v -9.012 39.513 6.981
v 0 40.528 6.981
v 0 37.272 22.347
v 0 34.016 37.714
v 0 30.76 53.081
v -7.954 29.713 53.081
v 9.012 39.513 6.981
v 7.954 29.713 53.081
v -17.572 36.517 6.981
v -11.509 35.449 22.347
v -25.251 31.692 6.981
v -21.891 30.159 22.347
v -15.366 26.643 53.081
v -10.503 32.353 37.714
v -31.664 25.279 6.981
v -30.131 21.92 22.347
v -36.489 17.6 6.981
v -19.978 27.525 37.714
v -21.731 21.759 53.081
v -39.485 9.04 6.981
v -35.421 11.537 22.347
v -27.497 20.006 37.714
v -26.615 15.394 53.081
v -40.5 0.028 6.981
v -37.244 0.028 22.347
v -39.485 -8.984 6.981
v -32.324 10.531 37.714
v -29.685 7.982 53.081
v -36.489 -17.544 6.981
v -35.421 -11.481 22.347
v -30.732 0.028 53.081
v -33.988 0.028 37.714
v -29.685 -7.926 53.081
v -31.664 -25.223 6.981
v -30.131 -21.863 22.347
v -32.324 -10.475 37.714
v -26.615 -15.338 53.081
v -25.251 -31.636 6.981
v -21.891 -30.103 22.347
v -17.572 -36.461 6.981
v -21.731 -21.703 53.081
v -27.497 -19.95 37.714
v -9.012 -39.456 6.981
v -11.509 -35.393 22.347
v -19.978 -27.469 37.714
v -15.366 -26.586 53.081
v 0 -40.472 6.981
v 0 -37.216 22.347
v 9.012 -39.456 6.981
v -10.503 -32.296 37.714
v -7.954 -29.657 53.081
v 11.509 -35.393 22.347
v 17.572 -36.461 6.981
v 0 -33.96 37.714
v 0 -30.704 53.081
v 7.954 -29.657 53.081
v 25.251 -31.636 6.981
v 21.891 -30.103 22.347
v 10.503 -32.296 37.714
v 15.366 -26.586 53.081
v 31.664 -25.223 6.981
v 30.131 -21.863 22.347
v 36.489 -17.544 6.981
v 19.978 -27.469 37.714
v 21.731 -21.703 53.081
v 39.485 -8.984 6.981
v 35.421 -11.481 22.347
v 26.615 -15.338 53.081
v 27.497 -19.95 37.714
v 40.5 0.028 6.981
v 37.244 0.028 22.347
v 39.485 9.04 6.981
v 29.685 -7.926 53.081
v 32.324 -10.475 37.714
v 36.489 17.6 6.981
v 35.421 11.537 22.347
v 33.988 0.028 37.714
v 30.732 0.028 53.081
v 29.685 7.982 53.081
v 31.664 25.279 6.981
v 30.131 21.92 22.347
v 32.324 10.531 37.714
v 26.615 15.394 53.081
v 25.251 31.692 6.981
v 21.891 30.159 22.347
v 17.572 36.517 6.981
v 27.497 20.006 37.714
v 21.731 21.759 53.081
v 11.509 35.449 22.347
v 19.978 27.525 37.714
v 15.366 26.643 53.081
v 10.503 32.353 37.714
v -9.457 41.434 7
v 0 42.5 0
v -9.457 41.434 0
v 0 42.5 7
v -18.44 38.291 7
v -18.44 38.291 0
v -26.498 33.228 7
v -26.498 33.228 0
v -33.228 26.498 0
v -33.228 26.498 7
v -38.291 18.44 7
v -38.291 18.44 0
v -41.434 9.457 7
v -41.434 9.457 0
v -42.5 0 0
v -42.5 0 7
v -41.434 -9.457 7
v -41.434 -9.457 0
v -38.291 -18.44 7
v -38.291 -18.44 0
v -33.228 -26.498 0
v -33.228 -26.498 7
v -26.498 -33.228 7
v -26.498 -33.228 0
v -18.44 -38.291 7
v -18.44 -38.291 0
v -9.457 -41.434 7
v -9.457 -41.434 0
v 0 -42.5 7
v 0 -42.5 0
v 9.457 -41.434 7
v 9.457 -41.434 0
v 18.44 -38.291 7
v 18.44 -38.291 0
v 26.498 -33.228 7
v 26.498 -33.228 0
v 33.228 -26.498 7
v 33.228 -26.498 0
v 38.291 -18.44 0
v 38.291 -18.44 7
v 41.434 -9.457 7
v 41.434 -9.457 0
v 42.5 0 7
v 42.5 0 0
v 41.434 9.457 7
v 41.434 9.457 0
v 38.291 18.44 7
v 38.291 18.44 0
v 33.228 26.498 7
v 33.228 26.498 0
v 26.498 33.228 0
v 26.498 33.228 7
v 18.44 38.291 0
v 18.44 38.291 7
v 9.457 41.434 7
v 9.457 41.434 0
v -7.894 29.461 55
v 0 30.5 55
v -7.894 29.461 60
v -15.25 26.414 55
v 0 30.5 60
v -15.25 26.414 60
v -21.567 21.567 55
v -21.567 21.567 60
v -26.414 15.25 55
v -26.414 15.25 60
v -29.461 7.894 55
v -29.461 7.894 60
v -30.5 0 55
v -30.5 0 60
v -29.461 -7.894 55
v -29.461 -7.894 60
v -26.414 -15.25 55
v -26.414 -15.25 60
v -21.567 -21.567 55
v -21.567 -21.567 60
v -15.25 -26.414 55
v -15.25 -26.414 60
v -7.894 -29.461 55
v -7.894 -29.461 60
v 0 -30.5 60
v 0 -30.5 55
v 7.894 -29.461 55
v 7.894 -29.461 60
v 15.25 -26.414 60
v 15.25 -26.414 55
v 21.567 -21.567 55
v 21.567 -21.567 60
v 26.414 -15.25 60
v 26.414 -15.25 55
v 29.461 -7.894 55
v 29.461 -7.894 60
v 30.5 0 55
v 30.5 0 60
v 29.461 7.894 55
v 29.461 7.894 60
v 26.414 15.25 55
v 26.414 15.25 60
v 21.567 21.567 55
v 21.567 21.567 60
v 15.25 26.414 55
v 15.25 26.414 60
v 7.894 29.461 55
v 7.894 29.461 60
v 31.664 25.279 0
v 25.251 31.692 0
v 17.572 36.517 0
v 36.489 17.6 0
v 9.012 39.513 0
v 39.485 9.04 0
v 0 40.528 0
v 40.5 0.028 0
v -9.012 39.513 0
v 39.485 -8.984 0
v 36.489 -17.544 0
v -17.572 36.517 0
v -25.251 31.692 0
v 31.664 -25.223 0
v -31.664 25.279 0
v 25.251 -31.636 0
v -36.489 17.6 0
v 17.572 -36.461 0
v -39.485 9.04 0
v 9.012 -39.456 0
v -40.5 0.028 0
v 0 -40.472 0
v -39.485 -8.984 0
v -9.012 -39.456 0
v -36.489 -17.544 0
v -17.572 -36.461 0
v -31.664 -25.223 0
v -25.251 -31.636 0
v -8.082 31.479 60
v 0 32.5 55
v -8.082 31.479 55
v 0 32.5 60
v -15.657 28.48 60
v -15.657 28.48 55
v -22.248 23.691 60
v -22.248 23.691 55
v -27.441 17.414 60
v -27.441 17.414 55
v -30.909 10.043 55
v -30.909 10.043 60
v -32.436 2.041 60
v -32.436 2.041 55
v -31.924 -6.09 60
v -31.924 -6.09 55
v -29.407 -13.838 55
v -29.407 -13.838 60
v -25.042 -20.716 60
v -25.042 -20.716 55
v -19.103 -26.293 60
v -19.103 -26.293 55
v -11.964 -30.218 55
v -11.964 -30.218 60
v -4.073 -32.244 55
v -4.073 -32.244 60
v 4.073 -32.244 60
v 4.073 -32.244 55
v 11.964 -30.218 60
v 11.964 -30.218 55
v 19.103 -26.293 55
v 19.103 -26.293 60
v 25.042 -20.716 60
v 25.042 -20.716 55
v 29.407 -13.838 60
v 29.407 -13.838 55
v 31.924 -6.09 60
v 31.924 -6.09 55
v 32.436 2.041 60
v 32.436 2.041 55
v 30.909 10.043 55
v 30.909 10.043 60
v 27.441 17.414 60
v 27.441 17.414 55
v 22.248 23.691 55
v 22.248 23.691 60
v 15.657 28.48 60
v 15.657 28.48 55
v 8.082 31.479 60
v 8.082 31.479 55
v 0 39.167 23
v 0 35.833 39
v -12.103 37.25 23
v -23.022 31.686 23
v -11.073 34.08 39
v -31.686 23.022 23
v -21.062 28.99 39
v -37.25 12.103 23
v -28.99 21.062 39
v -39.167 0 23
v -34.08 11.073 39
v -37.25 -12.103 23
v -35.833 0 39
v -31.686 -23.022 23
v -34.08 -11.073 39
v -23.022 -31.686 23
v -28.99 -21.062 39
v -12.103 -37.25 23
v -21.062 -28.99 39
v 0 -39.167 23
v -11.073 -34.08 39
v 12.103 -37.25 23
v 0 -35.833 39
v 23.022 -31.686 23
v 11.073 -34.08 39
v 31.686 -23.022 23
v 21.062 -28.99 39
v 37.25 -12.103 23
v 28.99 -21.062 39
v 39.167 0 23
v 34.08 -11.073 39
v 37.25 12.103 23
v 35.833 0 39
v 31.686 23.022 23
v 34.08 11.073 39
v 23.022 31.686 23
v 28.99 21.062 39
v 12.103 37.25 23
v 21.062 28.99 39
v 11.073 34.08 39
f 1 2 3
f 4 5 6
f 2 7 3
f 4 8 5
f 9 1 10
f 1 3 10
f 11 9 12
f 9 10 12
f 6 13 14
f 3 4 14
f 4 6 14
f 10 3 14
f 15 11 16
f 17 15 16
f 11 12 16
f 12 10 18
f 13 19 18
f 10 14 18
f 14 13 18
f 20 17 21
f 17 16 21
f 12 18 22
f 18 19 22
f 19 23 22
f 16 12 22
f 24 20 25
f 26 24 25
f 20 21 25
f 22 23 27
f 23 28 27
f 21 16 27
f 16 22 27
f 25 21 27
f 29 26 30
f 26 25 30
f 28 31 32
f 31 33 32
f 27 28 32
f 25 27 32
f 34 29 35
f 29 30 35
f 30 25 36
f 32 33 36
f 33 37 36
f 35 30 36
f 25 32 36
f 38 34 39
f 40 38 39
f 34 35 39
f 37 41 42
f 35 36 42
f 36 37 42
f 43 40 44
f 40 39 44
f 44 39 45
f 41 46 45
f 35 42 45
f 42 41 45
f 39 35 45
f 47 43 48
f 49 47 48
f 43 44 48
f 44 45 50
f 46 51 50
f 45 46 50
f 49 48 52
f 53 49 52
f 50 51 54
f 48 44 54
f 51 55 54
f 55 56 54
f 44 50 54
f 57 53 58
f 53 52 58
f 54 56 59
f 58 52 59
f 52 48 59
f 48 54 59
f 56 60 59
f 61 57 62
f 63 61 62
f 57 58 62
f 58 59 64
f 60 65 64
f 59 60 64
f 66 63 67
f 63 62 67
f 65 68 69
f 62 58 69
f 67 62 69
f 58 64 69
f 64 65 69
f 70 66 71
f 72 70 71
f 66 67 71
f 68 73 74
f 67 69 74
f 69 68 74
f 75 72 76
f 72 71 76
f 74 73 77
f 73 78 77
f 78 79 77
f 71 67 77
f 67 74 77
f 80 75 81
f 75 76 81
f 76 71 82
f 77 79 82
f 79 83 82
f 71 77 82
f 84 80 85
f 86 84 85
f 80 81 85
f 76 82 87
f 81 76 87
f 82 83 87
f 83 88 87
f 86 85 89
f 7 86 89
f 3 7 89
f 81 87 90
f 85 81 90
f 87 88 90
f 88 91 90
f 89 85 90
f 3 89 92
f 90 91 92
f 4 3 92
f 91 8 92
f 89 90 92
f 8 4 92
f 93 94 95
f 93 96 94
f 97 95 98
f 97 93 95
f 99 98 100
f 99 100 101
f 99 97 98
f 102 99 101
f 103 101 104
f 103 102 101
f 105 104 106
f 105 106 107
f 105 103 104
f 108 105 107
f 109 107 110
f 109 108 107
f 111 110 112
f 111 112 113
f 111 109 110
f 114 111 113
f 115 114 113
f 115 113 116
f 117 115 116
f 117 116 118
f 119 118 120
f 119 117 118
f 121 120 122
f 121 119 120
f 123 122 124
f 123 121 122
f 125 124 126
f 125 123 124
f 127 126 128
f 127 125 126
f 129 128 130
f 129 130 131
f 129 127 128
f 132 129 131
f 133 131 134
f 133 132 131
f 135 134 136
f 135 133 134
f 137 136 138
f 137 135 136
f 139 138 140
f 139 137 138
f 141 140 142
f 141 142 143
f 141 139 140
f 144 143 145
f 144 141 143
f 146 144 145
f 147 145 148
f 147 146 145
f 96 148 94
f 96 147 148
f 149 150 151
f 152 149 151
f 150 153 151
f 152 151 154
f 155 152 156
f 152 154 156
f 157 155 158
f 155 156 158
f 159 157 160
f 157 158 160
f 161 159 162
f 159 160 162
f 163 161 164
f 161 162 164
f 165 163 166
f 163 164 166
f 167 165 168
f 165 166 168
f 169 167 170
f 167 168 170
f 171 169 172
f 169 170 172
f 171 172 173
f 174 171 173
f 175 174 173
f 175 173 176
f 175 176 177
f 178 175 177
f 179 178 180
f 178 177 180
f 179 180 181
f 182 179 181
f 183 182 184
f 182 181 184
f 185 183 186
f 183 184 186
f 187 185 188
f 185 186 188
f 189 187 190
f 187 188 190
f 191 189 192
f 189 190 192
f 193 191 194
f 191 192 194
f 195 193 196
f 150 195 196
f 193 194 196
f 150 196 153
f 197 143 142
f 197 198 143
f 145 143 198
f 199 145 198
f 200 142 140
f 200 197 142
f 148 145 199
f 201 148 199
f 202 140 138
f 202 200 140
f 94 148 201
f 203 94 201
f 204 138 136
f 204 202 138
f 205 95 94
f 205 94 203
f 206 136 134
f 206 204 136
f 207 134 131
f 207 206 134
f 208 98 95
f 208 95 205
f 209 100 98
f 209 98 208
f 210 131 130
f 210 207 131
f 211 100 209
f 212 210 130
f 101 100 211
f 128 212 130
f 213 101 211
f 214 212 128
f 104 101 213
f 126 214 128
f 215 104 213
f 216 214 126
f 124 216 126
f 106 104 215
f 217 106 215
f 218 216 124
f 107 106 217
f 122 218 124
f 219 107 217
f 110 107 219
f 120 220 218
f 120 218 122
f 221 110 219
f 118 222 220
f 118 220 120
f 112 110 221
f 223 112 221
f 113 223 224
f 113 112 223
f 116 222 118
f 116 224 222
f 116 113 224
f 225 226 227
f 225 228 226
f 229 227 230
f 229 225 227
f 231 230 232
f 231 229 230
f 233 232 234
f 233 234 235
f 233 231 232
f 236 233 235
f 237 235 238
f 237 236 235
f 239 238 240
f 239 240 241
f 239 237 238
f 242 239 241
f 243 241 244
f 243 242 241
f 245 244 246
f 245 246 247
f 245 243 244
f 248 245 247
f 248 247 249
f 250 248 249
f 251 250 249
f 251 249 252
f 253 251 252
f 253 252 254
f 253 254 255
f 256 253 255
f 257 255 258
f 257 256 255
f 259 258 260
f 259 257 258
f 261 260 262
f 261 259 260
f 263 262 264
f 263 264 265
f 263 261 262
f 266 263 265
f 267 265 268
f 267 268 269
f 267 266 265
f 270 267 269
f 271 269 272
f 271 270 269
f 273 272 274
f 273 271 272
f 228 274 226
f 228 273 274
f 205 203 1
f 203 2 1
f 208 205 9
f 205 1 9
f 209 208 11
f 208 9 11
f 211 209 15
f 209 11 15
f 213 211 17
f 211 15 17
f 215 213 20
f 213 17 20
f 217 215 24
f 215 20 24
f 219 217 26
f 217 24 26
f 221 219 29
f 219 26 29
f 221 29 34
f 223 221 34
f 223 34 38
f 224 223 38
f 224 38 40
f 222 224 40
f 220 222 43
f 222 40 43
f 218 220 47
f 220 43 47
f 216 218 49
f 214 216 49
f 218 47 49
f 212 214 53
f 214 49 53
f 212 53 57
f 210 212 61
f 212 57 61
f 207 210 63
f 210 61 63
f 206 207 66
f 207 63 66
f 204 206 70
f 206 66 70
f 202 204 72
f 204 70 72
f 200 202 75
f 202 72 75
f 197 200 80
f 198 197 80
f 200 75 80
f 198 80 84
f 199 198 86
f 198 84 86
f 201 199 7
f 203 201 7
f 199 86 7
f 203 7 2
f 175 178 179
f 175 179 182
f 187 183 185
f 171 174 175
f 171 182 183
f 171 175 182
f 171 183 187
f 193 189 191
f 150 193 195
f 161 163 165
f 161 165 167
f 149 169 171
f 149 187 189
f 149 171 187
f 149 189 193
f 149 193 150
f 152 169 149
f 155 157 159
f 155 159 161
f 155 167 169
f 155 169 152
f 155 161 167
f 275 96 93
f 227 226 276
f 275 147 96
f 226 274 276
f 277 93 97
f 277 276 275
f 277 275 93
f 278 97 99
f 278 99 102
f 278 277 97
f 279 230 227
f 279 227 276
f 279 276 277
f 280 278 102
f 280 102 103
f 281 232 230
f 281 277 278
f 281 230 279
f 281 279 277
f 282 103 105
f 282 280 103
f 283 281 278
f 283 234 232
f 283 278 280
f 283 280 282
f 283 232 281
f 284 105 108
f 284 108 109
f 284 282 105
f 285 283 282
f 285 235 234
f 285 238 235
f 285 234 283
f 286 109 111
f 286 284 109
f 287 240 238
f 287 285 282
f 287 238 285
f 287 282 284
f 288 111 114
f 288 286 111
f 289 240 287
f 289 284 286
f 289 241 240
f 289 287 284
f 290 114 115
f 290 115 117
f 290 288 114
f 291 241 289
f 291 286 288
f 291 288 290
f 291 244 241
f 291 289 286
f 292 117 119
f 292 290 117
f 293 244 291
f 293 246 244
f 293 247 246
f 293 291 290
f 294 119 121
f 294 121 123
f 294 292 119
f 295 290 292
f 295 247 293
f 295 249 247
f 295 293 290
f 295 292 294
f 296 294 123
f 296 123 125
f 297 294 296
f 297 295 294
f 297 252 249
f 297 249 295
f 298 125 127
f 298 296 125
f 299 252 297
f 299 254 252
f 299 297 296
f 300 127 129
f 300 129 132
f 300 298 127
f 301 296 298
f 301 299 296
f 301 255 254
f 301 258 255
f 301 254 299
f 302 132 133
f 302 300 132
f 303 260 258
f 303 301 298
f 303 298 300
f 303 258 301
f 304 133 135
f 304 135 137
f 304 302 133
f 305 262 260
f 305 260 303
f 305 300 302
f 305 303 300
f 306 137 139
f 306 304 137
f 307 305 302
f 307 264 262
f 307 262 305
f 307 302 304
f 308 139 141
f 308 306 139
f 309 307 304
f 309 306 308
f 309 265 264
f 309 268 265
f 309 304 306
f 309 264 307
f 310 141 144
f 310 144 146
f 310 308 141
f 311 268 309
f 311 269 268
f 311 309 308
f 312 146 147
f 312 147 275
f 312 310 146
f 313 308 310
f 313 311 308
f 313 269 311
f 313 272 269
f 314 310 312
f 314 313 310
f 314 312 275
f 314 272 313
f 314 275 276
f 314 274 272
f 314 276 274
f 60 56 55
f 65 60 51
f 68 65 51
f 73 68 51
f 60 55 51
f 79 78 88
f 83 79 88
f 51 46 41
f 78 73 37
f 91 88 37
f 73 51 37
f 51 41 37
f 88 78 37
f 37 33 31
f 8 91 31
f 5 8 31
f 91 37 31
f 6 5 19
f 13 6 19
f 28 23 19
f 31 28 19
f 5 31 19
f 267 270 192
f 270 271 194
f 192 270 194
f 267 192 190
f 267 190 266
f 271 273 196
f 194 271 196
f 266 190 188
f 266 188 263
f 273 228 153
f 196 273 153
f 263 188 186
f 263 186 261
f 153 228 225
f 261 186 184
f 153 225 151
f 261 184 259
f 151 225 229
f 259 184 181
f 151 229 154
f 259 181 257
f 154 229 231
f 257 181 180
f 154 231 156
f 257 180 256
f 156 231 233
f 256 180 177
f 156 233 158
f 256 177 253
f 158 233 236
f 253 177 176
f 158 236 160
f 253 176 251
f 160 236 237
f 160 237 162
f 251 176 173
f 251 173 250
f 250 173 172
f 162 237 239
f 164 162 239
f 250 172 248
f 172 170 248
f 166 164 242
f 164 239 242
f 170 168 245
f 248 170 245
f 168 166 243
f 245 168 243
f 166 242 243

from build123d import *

# Parameters (mm, degrees)
F0_W = 2
F0_H = 5


with BuildPart() as f1:
    # F0 (on Right) → F1 (revolve)
    with BuildSketch(Plane.YZ):
        Polygon((0, 55), (0, 0), (42.5, 0), (42.5, 7), (32.5, 55), (30.5, 55), align=None)
        with Locations((31.5, 57.5)):
            Rectangle(F0_W, F0_H)
    revolve(axis=Axis((0, 0, 27.5), (0, 0, 1)))

    # F2 (on Right) → F3 (revolve, cut)
    with BuildSketch(Plane.YZ):
        Polygon((0.028088, 53.080703), (0.028088, -0.419297), (40.528088, -0.419297), (40.528088, 6.980703), (30.759966, 53.080703), align=None)
    revolve(axis=Axis((0, 0.028088, 26.330703), (0, 0, 1)), mode=Mode.SUBTRACT)


solid = f1.part
